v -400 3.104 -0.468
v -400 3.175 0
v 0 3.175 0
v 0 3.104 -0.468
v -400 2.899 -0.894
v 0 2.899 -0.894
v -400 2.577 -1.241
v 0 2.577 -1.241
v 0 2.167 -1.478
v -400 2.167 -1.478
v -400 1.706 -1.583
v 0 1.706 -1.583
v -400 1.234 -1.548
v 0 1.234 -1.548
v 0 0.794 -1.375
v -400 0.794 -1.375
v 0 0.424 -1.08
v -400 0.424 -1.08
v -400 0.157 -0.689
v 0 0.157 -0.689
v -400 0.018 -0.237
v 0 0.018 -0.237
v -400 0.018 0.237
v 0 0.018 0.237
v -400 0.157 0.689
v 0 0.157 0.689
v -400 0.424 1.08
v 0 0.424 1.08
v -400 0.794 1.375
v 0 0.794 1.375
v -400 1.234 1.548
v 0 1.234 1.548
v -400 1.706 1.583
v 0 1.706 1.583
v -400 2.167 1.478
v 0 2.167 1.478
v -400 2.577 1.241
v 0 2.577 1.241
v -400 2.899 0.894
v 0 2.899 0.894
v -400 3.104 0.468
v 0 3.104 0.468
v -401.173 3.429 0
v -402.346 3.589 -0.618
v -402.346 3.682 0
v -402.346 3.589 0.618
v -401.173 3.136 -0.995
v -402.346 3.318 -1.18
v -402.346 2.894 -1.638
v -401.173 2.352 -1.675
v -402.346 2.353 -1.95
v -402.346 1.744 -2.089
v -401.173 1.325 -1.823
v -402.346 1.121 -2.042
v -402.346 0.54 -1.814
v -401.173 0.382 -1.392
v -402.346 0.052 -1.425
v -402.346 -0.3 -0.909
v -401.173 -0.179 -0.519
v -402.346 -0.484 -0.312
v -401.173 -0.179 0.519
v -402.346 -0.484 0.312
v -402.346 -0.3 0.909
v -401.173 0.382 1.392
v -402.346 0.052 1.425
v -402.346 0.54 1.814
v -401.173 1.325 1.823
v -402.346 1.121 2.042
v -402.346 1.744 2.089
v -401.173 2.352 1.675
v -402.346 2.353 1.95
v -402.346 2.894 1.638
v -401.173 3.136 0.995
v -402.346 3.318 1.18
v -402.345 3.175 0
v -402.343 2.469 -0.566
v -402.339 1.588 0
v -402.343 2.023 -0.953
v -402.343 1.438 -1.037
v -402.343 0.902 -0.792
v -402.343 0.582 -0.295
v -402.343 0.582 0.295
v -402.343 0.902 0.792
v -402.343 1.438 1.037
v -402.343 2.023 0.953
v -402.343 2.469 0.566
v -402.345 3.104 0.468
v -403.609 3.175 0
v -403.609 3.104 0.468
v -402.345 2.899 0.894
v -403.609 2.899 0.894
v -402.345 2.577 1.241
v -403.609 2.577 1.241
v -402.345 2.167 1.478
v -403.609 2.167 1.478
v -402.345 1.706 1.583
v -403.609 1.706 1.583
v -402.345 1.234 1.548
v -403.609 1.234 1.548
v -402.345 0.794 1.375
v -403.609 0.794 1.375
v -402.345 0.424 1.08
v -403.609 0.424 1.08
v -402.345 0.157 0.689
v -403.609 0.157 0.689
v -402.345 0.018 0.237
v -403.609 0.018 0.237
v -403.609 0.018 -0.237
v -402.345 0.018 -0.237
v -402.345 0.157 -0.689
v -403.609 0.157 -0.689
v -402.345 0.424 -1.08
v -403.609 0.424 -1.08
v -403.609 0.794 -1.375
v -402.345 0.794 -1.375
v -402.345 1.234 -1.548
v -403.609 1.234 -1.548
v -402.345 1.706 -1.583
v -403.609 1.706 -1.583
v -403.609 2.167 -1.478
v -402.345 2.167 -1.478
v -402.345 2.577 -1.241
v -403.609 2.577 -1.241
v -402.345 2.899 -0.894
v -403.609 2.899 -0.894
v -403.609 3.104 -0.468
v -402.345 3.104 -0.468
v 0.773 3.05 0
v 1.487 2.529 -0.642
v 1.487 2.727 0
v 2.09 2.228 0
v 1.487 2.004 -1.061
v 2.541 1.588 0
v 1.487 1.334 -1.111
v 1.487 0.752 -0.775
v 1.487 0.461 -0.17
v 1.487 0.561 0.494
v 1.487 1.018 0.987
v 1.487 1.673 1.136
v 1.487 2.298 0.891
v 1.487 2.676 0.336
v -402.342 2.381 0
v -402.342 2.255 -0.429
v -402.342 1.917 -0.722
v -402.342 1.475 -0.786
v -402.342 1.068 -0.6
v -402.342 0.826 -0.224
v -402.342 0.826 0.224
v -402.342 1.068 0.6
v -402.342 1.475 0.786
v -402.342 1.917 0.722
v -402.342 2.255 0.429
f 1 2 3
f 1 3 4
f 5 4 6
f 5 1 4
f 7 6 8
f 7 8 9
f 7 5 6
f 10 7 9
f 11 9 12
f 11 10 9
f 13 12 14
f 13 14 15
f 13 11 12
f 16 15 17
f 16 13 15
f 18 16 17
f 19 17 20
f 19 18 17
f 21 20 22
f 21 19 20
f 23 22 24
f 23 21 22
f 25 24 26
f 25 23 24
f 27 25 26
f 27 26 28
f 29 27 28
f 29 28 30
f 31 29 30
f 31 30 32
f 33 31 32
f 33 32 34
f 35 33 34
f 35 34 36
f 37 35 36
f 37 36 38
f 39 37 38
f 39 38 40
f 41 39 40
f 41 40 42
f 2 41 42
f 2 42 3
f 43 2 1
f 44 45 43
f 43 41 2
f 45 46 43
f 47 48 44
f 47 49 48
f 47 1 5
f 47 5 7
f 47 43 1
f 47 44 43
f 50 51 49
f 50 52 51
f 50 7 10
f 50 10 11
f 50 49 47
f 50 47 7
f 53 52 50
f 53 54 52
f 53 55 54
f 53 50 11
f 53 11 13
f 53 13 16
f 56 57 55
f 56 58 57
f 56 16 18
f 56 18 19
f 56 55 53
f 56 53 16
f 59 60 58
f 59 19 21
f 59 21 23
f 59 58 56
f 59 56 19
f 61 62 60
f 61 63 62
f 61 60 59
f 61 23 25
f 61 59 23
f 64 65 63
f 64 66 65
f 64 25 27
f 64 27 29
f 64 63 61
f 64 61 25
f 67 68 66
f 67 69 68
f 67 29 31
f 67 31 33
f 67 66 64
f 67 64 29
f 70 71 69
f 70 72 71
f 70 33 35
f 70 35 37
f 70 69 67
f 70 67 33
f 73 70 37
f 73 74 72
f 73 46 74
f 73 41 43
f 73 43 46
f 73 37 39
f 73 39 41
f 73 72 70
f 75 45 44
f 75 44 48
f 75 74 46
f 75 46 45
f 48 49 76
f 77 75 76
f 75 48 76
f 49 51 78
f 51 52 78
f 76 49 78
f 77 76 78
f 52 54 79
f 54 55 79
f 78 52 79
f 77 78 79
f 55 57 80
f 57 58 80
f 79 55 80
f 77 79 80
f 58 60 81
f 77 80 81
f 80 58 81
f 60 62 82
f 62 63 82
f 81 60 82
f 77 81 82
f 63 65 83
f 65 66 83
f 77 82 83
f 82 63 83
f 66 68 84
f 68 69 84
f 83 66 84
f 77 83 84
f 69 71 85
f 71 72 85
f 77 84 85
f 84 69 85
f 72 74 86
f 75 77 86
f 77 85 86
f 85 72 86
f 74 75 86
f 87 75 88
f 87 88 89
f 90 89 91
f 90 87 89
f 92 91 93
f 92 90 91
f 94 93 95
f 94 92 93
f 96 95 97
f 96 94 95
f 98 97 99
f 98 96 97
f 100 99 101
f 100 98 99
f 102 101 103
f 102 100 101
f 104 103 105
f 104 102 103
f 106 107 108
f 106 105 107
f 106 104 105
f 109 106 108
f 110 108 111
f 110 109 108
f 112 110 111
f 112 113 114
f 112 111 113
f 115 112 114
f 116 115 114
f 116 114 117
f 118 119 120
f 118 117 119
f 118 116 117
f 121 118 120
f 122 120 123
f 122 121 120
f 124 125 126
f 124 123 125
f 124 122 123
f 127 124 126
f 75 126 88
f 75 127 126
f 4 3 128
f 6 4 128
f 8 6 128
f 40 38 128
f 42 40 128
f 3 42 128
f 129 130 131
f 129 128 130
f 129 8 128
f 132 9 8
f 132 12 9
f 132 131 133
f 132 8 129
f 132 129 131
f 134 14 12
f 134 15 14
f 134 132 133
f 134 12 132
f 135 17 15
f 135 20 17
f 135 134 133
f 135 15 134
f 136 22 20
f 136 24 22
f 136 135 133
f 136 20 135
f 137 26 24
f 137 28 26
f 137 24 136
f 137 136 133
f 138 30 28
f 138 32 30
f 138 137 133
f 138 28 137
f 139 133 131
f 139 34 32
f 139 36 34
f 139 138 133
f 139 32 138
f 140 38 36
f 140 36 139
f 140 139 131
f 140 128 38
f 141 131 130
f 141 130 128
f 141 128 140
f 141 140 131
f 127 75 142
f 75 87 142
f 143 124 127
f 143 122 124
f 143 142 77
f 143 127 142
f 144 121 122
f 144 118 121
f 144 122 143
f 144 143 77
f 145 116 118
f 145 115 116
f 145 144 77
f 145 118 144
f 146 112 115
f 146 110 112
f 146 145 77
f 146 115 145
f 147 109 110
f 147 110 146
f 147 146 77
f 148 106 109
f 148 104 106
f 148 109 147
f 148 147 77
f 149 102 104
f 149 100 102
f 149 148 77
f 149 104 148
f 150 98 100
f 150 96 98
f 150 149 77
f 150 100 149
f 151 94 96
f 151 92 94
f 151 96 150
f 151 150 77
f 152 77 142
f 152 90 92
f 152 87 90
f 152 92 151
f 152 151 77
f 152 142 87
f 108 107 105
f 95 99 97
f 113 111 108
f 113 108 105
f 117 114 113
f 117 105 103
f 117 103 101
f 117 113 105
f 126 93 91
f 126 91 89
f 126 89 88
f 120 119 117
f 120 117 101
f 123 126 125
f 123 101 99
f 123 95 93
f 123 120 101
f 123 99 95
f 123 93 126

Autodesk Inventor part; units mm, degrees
ref_plane "YZ Plane" through (0, 0, 0) normal (1, 0, 0) x (0, 1, 0)
ref_plane "XZ Plane" through (0, 0, 0) normal (0, 1, 0) x (-1, 0, 0)
ref_plane "XY Plane" through (0, 0, 0) normal (0, 0, 1) x (1, 0, 0)
sketch "Sketch1" plane through (0, 0, 0) normal (0, 0, 1) x (1, 0, 0)
  line L0 (0, 1.5875) -> (0, 3.175)
  line L1 (0, 3.175) -> (0, 1.5875)
  line L2 (0, 1.5875) -> (2.5414, 1.5875)
  arc A0 (2.5414, 1.5875) -> (0, 3.175) centre (-0.0802, 0.2187) ccw
  line L3 (0, 1.5875) -> (-230, 1.5875)
  line L4 (-230, 1.5875) -> (-400, 1.5875)
  line L5 (0, 3.175) -> (-400, 3.175)
  line L6 (-400, 3.175) -> (-400, 1.5875)
  line L7 (-400, 3.175) -> (-402.3464, 3.6825)
  line L8 (-402.3393, 1.5875) -> (-402.3464, 3.6825)
  line L9 (-400, 1.5875) -> (-402.3393, 1.5875)
  line L10 (-402.3393, 1.5875) -> (-403.6093, 1.5875)
  line L11 (-403.6093, 1.5875) -> (-403.6093, 3.175)
  line L12 (-403.6093, 3.175) -> (-402.3447, 3.175)
  point P0 (0, 0)
  dimension "d0" = 3.175
  dimension "d5" = 230
  dimension "d6" = 170
  dimension "d7" = 400
  dimension "d9" = 1.27
  dimension "d11" = 1.5875
revolve "Revolution1" add sketch "Sketch1" angle 360 about axis through (-230, 1.5875, 0) along (-1, 0, 0) contours L3 L4 L6 L5 L0 | L0 A0 L2 | L6 L9 L8 L7
revolve "Revolution2" add sketch "Sketch1" angle 360 about axis through (-402.3393, 1.5875, 0) along (-1, 0, 0) contours L10 L11 L12 L8
properties part number "Tc-2"
